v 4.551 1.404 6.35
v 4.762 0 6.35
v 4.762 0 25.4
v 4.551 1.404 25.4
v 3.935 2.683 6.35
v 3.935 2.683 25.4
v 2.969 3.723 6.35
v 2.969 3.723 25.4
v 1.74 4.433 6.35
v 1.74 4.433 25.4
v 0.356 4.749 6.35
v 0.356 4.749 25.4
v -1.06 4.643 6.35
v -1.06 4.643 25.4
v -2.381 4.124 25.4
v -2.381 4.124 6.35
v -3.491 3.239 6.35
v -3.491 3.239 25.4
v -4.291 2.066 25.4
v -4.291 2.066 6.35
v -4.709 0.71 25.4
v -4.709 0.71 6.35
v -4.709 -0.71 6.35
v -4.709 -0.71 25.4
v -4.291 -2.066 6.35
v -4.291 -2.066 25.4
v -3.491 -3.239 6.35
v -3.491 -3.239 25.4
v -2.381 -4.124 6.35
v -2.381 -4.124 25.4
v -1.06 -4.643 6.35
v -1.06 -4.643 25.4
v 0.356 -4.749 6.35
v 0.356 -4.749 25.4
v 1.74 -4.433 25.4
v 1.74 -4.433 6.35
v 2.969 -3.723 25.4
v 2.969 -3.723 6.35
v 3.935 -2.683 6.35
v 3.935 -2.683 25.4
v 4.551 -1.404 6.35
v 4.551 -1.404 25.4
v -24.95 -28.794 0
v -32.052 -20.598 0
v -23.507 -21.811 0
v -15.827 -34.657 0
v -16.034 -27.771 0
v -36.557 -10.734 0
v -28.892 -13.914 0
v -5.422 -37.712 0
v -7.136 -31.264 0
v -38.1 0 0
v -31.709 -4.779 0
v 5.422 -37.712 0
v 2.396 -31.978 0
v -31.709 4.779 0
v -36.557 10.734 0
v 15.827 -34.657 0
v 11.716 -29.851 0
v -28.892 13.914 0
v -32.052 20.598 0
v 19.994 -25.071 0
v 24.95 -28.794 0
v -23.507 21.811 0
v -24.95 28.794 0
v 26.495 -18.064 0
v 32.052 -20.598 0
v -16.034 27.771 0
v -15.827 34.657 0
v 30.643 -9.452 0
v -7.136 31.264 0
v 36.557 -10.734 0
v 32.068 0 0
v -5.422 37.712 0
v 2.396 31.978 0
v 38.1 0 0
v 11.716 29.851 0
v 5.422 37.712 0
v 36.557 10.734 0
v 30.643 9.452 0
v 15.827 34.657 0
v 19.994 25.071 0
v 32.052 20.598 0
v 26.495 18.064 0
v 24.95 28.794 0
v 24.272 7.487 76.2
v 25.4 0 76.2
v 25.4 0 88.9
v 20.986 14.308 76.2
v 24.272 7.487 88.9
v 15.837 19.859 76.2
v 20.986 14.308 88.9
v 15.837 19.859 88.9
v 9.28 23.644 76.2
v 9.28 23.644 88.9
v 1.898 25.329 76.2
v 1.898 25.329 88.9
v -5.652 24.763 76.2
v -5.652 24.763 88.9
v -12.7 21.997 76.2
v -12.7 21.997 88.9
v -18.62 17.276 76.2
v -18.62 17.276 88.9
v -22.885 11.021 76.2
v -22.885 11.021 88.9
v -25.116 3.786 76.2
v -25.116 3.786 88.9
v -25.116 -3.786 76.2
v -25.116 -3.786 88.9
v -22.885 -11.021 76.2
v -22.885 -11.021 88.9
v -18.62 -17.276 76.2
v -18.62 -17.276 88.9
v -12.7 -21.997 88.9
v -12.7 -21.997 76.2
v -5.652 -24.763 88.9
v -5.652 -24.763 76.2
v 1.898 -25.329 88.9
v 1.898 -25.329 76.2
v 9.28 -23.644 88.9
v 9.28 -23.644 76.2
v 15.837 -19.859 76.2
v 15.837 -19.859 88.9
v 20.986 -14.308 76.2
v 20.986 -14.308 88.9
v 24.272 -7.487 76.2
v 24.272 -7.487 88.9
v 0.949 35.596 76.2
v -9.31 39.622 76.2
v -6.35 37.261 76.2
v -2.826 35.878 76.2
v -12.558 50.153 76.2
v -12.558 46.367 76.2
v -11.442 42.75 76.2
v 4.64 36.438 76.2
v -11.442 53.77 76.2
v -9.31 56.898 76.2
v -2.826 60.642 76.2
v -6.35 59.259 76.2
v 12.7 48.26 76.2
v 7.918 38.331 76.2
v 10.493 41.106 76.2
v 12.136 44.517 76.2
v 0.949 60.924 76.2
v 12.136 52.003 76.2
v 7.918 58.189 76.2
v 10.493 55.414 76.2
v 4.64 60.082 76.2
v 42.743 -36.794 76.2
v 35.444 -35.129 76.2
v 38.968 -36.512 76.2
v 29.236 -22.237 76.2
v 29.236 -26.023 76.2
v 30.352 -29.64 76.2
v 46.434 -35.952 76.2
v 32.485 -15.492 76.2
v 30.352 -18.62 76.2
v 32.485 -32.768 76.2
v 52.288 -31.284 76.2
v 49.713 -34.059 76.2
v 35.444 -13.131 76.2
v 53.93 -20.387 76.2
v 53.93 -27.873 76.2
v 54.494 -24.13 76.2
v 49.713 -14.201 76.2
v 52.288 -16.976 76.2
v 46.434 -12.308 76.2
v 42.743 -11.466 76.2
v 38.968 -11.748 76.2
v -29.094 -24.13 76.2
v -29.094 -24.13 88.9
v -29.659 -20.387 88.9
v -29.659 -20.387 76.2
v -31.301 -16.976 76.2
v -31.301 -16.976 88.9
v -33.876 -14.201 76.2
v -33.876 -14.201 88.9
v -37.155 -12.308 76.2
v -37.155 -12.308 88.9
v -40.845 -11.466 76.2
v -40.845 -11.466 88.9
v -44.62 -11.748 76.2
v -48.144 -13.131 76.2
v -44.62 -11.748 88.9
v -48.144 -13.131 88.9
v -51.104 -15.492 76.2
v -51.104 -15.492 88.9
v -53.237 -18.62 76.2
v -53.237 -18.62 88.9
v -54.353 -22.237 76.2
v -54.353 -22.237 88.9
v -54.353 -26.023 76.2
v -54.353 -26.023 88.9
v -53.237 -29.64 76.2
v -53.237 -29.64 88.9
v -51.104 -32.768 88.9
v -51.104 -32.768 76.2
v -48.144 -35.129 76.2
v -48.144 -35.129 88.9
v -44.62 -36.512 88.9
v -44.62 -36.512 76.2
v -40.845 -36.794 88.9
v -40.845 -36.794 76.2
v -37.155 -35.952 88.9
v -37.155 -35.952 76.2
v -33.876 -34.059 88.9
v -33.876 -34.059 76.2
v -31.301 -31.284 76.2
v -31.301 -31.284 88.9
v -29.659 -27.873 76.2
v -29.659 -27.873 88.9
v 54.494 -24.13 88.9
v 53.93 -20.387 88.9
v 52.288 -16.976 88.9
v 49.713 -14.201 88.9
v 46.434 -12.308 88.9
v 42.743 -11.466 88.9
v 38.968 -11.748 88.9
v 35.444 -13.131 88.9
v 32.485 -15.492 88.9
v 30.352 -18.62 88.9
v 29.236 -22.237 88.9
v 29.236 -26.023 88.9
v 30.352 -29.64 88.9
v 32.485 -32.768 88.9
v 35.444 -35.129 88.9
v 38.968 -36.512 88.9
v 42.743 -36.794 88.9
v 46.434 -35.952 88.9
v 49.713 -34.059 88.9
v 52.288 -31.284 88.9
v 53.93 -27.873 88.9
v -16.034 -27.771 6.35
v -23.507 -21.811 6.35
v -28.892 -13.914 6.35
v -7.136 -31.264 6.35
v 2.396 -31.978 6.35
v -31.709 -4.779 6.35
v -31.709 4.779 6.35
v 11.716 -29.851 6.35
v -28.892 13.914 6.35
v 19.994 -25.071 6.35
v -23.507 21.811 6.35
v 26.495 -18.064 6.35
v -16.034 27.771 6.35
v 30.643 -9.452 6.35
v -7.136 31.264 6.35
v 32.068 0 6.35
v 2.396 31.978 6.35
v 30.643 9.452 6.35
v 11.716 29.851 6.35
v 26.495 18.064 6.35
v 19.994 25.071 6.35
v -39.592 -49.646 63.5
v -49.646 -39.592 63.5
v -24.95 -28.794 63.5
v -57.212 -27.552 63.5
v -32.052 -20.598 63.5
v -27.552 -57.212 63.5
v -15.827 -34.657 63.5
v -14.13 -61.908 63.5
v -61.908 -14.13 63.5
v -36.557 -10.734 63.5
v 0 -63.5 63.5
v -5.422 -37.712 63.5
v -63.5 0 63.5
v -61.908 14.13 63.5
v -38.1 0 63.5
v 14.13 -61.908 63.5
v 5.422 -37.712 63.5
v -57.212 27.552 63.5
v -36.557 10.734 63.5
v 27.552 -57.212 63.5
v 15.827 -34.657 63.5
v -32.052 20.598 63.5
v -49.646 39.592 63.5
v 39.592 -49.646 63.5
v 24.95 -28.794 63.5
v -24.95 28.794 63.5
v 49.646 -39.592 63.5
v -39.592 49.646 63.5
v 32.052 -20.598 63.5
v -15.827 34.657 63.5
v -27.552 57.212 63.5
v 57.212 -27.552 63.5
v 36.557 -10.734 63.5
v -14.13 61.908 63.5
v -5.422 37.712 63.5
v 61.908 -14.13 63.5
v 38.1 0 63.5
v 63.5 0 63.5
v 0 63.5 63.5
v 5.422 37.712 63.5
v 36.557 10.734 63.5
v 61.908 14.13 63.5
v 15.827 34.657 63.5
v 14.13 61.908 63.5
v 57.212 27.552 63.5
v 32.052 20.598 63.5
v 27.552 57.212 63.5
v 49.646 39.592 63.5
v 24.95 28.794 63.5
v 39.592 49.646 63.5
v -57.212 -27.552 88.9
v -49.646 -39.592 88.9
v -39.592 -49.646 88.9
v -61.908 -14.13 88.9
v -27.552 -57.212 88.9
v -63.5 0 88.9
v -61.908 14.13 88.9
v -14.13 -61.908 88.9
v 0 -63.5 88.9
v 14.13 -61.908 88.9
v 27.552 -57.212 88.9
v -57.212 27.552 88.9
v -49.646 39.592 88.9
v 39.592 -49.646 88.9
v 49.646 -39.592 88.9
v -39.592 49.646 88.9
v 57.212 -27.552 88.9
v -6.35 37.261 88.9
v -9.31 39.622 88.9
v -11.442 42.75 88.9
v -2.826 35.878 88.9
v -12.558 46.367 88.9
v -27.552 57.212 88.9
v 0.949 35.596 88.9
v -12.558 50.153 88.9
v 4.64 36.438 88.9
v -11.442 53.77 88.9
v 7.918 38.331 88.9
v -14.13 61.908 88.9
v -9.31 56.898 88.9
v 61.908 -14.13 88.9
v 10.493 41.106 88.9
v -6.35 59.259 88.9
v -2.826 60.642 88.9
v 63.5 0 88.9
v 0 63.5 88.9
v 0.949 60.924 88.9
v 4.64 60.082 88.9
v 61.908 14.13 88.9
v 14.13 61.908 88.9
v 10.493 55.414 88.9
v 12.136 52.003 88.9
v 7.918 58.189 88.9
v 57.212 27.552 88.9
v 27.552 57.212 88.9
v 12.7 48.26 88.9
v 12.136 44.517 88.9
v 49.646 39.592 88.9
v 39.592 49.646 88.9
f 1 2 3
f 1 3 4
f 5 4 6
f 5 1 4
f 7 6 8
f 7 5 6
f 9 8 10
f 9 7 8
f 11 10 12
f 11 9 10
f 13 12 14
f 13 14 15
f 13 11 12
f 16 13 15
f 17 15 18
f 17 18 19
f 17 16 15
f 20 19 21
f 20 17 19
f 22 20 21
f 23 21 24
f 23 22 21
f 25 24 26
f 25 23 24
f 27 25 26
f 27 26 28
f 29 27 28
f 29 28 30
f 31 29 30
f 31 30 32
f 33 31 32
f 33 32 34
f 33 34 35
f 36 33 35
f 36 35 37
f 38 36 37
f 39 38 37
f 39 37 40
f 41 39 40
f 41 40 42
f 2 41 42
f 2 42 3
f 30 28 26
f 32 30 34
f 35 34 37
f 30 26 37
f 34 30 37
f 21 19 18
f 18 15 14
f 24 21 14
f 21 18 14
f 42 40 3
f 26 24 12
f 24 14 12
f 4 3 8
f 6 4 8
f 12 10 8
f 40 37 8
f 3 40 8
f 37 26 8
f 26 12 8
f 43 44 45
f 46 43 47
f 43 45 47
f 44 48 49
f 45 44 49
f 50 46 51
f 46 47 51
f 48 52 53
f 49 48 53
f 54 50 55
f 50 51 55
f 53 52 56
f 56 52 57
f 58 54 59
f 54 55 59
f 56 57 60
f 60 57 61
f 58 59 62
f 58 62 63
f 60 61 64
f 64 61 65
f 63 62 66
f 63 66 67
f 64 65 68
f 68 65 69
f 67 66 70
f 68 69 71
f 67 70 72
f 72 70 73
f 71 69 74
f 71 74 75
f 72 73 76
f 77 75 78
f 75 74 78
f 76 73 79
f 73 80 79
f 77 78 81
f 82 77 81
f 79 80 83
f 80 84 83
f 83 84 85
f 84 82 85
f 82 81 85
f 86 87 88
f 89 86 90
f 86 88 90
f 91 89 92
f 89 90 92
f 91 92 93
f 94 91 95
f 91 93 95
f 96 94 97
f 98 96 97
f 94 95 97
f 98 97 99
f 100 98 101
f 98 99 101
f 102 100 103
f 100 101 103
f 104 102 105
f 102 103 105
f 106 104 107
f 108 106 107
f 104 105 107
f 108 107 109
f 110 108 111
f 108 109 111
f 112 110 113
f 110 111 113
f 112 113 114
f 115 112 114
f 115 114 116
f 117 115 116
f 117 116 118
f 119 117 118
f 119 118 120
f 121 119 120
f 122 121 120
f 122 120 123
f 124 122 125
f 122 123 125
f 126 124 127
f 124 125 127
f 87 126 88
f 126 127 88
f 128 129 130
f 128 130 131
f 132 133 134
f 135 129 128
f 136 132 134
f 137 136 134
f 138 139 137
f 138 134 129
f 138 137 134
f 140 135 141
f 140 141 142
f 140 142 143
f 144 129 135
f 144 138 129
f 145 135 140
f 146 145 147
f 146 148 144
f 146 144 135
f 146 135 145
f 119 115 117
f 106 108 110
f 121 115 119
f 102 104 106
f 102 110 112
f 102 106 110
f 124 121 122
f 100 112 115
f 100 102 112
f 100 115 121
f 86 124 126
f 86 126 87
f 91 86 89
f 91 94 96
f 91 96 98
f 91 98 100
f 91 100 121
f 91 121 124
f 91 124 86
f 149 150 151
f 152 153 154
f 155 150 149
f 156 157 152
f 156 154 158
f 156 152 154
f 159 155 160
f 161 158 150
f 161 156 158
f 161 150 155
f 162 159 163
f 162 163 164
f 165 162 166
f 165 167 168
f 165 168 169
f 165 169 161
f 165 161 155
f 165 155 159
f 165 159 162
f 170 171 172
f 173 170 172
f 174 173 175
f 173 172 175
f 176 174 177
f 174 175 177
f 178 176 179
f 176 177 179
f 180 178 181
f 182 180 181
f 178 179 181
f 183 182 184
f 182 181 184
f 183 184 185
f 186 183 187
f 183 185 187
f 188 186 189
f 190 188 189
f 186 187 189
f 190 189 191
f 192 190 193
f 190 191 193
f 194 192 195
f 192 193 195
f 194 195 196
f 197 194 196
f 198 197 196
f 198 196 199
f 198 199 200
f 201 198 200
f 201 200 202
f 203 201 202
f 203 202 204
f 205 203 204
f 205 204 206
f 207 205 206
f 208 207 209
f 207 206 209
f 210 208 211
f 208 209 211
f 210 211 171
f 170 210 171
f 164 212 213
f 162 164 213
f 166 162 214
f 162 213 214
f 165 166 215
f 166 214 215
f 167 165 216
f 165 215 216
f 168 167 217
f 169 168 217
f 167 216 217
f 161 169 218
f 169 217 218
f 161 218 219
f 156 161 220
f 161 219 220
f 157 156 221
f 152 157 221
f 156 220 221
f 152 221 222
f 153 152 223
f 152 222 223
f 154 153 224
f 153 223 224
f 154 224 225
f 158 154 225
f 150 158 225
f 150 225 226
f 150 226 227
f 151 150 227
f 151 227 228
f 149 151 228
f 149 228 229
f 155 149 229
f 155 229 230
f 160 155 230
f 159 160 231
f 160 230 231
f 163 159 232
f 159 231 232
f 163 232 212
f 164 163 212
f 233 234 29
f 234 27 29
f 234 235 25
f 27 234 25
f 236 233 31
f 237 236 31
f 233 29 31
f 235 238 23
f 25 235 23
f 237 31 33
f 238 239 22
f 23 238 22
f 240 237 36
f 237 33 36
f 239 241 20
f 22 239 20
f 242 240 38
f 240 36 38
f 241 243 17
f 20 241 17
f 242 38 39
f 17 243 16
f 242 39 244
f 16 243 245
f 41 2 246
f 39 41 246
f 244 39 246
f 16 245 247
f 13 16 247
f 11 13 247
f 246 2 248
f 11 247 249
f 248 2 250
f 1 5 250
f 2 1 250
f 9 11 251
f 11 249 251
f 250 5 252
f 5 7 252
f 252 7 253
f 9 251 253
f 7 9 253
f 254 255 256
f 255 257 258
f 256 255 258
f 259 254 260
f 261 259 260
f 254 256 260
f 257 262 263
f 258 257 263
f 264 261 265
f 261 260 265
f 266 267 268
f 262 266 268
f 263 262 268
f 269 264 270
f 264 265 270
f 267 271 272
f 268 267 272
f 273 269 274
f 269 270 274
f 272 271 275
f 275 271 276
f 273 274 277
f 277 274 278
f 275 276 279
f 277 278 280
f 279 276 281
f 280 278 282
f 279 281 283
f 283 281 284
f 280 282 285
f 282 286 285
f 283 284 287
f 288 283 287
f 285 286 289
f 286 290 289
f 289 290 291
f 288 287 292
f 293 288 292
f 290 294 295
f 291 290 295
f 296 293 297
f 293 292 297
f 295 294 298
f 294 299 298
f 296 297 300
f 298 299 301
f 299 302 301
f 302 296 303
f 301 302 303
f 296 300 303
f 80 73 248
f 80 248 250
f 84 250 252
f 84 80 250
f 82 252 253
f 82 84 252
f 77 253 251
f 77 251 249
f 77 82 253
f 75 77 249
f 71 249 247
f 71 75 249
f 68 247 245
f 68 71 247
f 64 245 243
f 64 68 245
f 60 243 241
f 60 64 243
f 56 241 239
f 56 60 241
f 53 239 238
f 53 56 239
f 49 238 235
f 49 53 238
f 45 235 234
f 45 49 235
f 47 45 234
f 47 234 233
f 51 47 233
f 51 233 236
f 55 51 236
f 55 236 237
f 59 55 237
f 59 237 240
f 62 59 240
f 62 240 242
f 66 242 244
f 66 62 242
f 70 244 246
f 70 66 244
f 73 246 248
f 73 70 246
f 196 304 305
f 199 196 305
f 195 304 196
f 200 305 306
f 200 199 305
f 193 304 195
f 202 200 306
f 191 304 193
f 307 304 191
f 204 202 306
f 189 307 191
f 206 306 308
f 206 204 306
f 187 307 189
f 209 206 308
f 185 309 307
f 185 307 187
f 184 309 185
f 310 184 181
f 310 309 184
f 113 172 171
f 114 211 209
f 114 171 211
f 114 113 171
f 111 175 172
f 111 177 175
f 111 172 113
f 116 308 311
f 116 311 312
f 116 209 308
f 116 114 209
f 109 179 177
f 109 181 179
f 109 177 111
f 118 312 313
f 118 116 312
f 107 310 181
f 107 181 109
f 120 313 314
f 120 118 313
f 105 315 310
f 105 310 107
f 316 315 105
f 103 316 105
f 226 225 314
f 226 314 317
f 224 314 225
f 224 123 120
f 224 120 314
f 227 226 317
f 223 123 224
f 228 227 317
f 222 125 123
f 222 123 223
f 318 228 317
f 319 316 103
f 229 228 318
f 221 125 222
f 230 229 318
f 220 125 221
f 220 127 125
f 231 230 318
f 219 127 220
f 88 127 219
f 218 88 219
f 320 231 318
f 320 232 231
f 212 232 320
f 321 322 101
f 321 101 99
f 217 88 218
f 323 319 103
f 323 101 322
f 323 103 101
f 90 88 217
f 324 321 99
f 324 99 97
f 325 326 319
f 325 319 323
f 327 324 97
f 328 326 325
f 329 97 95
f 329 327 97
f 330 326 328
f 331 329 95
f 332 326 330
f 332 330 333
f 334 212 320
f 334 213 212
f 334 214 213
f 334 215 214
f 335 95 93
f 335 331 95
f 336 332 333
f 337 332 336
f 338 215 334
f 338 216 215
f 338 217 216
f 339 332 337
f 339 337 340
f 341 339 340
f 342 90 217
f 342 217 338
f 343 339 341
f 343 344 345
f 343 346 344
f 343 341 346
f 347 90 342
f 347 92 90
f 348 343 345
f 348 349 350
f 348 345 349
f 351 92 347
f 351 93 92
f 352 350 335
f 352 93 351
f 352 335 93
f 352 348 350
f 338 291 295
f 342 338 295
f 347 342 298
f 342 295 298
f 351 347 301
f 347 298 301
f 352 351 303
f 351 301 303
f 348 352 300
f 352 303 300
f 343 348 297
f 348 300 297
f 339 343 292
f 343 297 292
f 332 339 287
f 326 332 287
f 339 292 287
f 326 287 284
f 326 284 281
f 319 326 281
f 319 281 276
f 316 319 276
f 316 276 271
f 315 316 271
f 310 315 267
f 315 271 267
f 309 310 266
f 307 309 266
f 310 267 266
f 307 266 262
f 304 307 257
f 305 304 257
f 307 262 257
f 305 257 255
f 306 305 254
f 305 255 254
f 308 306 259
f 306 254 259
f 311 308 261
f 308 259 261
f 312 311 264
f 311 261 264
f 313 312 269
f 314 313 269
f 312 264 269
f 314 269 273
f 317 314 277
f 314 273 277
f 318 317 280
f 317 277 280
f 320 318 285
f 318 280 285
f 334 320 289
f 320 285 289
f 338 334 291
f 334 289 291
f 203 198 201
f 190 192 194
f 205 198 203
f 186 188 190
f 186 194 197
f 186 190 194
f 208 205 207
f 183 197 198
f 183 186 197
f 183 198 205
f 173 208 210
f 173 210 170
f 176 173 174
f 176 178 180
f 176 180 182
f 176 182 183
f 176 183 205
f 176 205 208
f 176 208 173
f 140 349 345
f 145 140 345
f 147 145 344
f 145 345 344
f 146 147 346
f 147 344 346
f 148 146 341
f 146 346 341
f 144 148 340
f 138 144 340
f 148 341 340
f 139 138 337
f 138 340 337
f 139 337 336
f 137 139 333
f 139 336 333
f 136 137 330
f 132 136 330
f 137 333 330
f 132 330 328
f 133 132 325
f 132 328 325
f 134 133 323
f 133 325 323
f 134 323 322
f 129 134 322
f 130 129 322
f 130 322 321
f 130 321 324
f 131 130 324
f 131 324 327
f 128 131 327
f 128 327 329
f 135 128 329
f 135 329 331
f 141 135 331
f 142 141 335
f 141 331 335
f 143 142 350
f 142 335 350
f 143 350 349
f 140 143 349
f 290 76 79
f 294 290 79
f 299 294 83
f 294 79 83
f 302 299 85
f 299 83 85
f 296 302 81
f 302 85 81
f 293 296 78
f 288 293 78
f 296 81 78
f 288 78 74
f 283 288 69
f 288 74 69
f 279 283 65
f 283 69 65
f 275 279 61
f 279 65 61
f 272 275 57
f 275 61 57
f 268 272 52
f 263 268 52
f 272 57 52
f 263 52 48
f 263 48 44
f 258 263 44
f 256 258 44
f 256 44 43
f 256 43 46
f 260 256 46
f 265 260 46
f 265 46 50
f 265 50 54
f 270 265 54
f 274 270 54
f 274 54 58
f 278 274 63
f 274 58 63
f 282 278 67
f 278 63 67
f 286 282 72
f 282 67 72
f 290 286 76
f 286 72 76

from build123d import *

# Parameters (mm, degrees)
F0_R     = 38.1
F0_R_2   = 32.0675
F1_DEPTH = 63.5
F2_DEPTH = 6.35
F3_R     = 4.7625
F4_DEPTH = 25.4
F5_R     = 63.5
F6_DEPTH = 25.4
F7_R     = 12.7
F7_R_2   = 25.4
F8_DEPTH = 12.7


with BuildPart() as f1:
    # F0 (on Top) → F1 (new body)
    with BuildSketch(Plane.XY):
        Circle(F0_R)
        Circle(F0_R_2, mode=Mode.SUBTRACT)
        Circle(F0_R_2)
    extrude(amount=F1_DEPTH)

    # F0 (on Top) → F2 (cut)
    with BuildSketch(Plane.XY):
        Circle(F0_R_2)
    extrude(amount=F2_DEPTH, mode=Mode.SUBTRACT)

    # F3 (on Top) → F4 (cut)
    with BuildSketch(Plane.XY):
        Circle(F3_R)
    extrude(amount=F4_DEPTH, mode=Mode.SUBTRACT)

    # F5 (on face) → F6 (join)
    with BuildSketch(Plane.XY.offset(63.5)):
        Circle(F5_R)
    extrude(amount=F6_DEPTH)

    # F7 (on face) → F8 (cut)
    with BuildSketch(Plane.XY.offset(88.9)):
        with Locations((0, 48.26)):
            Circle(F7_R)
        with Locations((-41.794386, -24.13)):
            Circle(F7_R)
        with Locations((41.794386, -24.13)):
            Circle(F7_R)
        Circle(F7_R_2)
    extrude(amount=-F8_DEPTH, mode=Mode.SUBTRACT)


solid = f1.part
